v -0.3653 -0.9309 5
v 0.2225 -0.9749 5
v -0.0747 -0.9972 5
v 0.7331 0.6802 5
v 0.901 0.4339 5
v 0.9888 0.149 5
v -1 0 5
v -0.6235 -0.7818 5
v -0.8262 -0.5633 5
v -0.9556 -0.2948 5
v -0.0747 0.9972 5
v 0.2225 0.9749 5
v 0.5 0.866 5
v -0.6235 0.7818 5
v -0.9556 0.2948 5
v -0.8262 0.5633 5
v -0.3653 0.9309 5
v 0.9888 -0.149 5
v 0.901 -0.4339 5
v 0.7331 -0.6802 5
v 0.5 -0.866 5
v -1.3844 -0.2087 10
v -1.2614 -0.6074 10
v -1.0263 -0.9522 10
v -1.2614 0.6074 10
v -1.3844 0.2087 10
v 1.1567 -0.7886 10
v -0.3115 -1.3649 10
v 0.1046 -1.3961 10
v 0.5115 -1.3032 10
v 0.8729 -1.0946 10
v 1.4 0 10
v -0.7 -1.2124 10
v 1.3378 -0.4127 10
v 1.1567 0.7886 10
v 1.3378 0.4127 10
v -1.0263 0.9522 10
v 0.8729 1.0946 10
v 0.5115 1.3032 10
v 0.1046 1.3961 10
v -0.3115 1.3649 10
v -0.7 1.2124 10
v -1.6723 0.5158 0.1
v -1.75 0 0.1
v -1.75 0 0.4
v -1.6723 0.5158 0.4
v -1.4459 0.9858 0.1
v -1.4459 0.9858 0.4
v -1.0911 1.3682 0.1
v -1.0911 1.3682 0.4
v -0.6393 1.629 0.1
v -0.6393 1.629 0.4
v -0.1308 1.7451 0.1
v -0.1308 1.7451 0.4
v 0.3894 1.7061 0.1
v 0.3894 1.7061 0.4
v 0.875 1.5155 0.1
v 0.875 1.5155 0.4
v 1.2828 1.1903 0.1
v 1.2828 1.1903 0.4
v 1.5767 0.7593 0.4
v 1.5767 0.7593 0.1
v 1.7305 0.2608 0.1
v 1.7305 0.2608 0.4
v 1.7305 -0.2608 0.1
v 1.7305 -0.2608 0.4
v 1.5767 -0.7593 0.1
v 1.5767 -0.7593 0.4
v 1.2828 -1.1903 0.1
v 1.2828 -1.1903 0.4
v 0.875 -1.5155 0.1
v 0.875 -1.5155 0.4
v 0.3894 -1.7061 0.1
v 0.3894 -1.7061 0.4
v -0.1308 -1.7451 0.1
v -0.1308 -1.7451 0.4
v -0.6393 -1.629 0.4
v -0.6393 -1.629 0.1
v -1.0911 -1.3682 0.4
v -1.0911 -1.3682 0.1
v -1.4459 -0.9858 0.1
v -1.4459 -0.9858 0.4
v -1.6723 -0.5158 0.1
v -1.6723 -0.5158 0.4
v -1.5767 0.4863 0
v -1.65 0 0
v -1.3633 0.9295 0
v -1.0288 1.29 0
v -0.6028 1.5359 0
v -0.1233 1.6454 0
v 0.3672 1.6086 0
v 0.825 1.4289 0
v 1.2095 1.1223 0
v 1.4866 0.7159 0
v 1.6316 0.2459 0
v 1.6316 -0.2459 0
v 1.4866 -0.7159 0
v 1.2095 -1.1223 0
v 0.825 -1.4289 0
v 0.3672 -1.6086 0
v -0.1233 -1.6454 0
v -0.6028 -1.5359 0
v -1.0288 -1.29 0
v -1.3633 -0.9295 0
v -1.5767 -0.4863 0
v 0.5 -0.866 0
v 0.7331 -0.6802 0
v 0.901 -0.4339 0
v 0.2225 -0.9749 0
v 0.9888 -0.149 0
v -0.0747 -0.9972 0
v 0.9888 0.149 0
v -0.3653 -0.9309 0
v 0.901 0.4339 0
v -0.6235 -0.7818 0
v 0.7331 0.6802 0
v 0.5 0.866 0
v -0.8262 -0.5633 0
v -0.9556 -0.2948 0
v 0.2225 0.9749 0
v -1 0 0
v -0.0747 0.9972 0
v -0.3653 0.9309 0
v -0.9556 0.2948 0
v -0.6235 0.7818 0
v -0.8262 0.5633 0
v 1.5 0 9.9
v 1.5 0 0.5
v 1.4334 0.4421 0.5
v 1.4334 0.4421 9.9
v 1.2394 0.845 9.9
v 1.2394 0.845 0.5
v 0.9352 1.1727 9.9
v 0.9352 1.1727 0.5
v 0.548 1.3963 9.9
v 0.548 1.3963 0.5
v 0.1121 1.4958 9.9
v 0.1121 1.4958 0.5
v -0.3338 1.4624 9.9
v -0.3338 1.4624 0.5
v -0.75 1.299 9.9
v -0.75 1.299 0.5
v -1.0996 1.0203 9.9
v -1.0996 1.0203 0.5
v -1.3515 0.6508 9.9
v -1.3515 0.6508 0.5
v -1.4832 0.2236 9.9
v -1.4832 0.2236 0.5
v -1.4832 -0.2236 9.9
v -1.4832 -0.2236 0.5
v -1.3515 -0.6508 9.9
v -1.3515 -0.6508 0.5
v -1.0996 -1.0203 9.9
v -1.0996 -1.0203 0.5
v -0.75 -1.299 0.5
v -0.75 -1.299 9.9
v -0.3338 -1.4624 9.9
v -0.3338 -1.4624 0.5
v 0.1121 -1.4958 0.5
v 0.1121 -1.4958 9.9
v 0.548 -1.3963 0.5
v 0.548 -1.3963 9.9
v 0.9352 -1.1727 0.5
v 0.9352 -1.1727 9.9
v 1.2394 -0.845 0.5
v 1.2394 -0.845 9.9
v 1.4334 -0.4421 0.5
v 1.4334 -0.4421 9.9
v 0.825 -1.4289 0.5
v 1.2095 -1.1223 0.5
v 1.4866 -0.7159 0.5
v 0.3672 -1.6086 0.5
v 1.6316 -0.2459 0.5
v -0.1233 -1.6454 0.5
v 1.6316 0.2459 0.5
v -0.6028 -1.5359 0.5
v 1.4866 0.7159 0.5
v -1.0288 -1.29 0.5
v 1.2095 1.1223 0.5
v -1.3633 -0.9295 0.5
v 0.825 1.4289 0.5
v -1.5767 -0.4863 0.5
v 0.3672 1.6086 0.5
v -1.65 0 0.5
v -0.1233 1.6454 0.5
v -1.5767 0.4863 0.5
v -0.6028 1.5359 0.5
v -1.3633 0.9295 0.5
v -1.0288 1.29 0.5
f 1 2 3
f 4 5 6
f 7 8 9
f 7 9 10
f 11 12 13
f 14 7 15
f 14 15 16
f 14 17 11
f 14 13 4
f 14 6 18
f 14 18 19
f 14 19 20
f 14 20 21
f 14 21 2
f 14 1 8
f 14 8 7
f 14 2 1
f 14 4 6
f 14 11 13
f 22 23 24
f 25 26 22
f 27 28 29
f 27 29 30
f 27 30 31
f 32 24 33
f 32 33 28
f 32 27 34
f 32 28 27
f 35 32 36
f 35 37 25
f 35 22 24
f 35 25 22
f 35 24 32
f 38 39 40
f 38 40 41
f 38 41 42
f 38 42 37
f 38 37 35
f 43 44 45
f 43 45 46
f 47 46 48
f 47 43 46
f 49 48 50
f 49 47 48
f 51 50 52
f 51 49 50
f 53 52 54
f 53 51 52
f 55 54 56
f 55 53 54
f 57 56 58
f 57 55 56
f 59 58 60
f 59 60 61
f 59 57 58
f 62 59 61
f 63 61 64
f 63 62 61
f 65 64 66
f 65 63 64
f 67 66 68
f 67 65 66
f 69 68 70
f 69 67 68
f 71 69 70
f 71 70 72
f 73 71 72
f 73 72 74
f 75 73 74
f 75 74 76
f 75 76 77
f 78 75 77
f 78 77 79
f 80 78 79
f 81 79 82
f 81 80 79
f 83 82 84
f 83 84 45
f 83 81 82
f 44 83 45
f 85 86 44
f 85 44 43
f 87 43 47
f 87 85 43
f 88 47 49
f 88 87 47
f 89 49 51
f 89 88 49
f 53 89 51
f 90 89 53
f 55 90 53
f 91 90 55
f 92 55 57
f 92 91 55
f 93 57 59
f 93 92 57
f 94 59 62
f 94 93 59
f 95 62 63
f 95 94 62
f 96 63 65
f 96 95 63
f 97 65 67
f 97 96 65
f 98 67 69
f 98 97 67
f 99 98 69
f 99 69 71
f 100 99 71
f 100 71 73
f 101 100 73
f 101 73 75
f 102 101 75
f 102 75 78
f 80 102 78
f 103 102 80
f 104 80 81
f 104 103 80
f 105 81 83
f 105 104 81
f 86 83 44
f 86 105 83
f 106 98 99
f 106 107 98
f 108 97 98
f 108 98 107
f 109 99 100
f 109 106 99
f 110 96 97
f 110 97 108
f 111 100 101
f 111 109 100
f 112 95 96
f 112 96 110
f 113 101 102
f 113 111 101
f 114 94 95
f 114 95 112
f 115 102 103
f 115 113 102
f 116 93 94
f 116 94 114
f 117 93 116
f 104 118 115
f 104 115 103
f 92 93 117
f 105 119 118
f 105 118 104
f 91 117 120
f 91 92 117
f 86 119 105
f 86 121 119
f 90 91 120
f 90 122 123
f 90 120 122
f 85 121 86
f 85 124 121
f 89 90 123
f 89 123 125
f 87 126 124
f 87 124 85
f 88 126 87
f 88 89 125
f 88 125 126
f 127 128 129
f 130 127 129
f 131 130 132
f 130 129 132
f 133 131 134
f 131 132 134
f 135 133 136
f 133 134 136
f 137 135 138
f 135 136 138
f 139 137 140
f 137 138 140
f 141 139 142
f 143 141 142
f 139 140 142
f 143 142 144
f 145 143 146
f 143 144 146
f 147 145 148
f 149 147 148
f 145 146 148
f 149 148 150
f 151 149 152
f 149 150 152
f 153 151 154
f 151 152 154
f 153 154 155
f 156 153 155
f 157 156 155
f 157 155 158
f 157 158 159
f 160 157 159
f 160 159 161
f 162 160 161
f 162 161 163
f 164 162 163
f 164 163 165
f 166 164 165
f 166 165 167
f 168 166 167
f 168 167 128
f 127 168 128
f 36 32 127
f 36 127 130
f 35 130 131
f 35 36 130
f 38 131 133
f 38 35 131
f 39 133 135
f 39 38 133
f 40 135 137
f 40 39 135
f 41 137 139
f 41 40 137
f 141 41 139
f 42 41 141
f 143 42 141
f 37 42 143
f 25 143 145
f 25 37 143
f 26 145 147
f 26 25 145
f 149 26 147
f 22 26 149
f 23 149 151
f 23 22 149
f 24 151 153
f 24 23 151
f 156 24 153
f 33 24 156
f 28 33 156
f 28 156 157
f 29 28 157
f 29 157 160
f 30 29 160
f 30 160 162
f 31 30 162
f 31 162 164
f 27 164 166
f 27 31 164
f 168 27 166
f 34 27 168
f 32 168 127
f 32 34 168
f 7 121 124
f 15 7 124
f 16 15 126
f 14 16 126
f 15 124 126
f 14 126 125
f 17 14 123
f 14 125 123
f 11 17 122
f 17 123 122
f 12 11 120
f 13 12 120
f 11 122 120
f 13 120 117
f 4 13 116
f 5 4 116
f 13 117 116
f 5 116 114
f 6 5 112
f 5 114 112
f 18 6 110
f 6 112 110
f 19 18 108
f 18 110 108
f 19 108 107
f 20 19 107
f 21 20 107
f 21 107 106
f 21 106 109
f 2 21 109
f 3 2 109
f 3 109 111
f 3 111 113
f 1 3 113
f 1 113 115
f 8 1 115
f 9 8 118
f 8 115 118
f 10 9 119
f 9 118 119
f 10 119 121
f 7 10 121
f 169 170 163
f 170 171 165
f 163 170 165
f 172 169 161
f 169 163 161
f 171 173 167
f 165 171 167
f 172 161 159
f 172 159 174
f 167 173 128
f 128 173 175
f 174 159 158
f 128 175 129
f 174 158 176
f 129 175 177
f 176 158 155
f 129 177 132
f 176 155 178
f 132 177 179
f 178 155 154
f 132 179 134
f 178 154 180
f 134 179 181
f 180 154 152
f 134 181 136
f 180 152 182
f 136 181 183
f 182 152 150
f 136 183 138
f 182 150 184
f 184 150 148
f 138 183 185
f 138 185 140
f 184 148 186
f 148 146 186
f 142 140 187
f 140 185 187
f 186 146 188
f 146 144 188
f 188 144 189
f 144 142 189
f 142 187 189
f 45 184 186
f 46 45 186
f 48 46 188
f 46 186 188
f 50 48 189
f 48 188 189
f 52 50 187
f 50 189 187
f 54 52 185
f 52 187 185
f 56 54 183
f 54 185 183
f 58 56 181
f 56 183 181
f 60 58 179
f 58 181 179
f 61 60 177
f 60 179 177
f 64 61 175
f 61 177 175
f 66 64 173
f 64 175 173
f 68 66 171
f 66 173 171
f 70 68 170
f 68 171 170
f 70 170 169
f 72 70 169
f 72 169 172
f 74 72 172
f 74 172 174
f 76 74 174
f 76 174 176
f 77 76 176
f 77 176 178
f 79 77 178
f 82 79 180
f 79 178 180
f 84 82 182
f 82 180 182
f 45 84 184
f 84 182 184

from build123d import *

# Parameters (mm, degrees)
SKETCH_1_R          = 1.5
EXTRUDE_1_DEPTH     = 10
SKETCH_2_R          = 1.75
EXTRUDE_2_DEPTH     = 0.5
CHAMFER_1_SIZE      = 0.1
SKETCH_3_R          = 1
CUT_EXTRUDE_1_DEPTH = 5


with BuildPart() as part:
    # 草图1 → 凸台-拉伸1 (new body)
    with BuildSketch(Plane.XY):
        Circle(SKETCH_1_R)
    extrude(amount=EXTRUDE_1_DEPTH)

    # 草图2 → 凸台-拉伸2 (add)
    with BuildSketch(Plane(origin=(0, 0, 0), x_dir=(-1, 0, 0), z_dir=(0, 0, -1))):
        Circle(SKETCH_2_R)
    extrude(amount=-EXTRUDE_2_DEPTH)

    # 倒角1
    chamfer_1_edges = [part.edges().sort_by_distance(p)[0] for p in [
        (-1.5, 0, 10),
        (1.75, 0, 0.5),
        (1.75, 0, 0),
    ]]
    chamfer(chamfer_1_edges, length=CHAMFER_1_SIZE)

    # 草图3 → 切除-拉伸1 (cut)
    with BuildSketch(Plane(origin=(0, 0, 0), x_dir=(-1, 0, 0), z_dir=(0, 0, -1))):
        Circle(SKETCH_3_R)
    extrude(amount=-CUT_EXTRUDE_1_DEPTH, mode=Mode.SUBTRACT)


solid = part.part
